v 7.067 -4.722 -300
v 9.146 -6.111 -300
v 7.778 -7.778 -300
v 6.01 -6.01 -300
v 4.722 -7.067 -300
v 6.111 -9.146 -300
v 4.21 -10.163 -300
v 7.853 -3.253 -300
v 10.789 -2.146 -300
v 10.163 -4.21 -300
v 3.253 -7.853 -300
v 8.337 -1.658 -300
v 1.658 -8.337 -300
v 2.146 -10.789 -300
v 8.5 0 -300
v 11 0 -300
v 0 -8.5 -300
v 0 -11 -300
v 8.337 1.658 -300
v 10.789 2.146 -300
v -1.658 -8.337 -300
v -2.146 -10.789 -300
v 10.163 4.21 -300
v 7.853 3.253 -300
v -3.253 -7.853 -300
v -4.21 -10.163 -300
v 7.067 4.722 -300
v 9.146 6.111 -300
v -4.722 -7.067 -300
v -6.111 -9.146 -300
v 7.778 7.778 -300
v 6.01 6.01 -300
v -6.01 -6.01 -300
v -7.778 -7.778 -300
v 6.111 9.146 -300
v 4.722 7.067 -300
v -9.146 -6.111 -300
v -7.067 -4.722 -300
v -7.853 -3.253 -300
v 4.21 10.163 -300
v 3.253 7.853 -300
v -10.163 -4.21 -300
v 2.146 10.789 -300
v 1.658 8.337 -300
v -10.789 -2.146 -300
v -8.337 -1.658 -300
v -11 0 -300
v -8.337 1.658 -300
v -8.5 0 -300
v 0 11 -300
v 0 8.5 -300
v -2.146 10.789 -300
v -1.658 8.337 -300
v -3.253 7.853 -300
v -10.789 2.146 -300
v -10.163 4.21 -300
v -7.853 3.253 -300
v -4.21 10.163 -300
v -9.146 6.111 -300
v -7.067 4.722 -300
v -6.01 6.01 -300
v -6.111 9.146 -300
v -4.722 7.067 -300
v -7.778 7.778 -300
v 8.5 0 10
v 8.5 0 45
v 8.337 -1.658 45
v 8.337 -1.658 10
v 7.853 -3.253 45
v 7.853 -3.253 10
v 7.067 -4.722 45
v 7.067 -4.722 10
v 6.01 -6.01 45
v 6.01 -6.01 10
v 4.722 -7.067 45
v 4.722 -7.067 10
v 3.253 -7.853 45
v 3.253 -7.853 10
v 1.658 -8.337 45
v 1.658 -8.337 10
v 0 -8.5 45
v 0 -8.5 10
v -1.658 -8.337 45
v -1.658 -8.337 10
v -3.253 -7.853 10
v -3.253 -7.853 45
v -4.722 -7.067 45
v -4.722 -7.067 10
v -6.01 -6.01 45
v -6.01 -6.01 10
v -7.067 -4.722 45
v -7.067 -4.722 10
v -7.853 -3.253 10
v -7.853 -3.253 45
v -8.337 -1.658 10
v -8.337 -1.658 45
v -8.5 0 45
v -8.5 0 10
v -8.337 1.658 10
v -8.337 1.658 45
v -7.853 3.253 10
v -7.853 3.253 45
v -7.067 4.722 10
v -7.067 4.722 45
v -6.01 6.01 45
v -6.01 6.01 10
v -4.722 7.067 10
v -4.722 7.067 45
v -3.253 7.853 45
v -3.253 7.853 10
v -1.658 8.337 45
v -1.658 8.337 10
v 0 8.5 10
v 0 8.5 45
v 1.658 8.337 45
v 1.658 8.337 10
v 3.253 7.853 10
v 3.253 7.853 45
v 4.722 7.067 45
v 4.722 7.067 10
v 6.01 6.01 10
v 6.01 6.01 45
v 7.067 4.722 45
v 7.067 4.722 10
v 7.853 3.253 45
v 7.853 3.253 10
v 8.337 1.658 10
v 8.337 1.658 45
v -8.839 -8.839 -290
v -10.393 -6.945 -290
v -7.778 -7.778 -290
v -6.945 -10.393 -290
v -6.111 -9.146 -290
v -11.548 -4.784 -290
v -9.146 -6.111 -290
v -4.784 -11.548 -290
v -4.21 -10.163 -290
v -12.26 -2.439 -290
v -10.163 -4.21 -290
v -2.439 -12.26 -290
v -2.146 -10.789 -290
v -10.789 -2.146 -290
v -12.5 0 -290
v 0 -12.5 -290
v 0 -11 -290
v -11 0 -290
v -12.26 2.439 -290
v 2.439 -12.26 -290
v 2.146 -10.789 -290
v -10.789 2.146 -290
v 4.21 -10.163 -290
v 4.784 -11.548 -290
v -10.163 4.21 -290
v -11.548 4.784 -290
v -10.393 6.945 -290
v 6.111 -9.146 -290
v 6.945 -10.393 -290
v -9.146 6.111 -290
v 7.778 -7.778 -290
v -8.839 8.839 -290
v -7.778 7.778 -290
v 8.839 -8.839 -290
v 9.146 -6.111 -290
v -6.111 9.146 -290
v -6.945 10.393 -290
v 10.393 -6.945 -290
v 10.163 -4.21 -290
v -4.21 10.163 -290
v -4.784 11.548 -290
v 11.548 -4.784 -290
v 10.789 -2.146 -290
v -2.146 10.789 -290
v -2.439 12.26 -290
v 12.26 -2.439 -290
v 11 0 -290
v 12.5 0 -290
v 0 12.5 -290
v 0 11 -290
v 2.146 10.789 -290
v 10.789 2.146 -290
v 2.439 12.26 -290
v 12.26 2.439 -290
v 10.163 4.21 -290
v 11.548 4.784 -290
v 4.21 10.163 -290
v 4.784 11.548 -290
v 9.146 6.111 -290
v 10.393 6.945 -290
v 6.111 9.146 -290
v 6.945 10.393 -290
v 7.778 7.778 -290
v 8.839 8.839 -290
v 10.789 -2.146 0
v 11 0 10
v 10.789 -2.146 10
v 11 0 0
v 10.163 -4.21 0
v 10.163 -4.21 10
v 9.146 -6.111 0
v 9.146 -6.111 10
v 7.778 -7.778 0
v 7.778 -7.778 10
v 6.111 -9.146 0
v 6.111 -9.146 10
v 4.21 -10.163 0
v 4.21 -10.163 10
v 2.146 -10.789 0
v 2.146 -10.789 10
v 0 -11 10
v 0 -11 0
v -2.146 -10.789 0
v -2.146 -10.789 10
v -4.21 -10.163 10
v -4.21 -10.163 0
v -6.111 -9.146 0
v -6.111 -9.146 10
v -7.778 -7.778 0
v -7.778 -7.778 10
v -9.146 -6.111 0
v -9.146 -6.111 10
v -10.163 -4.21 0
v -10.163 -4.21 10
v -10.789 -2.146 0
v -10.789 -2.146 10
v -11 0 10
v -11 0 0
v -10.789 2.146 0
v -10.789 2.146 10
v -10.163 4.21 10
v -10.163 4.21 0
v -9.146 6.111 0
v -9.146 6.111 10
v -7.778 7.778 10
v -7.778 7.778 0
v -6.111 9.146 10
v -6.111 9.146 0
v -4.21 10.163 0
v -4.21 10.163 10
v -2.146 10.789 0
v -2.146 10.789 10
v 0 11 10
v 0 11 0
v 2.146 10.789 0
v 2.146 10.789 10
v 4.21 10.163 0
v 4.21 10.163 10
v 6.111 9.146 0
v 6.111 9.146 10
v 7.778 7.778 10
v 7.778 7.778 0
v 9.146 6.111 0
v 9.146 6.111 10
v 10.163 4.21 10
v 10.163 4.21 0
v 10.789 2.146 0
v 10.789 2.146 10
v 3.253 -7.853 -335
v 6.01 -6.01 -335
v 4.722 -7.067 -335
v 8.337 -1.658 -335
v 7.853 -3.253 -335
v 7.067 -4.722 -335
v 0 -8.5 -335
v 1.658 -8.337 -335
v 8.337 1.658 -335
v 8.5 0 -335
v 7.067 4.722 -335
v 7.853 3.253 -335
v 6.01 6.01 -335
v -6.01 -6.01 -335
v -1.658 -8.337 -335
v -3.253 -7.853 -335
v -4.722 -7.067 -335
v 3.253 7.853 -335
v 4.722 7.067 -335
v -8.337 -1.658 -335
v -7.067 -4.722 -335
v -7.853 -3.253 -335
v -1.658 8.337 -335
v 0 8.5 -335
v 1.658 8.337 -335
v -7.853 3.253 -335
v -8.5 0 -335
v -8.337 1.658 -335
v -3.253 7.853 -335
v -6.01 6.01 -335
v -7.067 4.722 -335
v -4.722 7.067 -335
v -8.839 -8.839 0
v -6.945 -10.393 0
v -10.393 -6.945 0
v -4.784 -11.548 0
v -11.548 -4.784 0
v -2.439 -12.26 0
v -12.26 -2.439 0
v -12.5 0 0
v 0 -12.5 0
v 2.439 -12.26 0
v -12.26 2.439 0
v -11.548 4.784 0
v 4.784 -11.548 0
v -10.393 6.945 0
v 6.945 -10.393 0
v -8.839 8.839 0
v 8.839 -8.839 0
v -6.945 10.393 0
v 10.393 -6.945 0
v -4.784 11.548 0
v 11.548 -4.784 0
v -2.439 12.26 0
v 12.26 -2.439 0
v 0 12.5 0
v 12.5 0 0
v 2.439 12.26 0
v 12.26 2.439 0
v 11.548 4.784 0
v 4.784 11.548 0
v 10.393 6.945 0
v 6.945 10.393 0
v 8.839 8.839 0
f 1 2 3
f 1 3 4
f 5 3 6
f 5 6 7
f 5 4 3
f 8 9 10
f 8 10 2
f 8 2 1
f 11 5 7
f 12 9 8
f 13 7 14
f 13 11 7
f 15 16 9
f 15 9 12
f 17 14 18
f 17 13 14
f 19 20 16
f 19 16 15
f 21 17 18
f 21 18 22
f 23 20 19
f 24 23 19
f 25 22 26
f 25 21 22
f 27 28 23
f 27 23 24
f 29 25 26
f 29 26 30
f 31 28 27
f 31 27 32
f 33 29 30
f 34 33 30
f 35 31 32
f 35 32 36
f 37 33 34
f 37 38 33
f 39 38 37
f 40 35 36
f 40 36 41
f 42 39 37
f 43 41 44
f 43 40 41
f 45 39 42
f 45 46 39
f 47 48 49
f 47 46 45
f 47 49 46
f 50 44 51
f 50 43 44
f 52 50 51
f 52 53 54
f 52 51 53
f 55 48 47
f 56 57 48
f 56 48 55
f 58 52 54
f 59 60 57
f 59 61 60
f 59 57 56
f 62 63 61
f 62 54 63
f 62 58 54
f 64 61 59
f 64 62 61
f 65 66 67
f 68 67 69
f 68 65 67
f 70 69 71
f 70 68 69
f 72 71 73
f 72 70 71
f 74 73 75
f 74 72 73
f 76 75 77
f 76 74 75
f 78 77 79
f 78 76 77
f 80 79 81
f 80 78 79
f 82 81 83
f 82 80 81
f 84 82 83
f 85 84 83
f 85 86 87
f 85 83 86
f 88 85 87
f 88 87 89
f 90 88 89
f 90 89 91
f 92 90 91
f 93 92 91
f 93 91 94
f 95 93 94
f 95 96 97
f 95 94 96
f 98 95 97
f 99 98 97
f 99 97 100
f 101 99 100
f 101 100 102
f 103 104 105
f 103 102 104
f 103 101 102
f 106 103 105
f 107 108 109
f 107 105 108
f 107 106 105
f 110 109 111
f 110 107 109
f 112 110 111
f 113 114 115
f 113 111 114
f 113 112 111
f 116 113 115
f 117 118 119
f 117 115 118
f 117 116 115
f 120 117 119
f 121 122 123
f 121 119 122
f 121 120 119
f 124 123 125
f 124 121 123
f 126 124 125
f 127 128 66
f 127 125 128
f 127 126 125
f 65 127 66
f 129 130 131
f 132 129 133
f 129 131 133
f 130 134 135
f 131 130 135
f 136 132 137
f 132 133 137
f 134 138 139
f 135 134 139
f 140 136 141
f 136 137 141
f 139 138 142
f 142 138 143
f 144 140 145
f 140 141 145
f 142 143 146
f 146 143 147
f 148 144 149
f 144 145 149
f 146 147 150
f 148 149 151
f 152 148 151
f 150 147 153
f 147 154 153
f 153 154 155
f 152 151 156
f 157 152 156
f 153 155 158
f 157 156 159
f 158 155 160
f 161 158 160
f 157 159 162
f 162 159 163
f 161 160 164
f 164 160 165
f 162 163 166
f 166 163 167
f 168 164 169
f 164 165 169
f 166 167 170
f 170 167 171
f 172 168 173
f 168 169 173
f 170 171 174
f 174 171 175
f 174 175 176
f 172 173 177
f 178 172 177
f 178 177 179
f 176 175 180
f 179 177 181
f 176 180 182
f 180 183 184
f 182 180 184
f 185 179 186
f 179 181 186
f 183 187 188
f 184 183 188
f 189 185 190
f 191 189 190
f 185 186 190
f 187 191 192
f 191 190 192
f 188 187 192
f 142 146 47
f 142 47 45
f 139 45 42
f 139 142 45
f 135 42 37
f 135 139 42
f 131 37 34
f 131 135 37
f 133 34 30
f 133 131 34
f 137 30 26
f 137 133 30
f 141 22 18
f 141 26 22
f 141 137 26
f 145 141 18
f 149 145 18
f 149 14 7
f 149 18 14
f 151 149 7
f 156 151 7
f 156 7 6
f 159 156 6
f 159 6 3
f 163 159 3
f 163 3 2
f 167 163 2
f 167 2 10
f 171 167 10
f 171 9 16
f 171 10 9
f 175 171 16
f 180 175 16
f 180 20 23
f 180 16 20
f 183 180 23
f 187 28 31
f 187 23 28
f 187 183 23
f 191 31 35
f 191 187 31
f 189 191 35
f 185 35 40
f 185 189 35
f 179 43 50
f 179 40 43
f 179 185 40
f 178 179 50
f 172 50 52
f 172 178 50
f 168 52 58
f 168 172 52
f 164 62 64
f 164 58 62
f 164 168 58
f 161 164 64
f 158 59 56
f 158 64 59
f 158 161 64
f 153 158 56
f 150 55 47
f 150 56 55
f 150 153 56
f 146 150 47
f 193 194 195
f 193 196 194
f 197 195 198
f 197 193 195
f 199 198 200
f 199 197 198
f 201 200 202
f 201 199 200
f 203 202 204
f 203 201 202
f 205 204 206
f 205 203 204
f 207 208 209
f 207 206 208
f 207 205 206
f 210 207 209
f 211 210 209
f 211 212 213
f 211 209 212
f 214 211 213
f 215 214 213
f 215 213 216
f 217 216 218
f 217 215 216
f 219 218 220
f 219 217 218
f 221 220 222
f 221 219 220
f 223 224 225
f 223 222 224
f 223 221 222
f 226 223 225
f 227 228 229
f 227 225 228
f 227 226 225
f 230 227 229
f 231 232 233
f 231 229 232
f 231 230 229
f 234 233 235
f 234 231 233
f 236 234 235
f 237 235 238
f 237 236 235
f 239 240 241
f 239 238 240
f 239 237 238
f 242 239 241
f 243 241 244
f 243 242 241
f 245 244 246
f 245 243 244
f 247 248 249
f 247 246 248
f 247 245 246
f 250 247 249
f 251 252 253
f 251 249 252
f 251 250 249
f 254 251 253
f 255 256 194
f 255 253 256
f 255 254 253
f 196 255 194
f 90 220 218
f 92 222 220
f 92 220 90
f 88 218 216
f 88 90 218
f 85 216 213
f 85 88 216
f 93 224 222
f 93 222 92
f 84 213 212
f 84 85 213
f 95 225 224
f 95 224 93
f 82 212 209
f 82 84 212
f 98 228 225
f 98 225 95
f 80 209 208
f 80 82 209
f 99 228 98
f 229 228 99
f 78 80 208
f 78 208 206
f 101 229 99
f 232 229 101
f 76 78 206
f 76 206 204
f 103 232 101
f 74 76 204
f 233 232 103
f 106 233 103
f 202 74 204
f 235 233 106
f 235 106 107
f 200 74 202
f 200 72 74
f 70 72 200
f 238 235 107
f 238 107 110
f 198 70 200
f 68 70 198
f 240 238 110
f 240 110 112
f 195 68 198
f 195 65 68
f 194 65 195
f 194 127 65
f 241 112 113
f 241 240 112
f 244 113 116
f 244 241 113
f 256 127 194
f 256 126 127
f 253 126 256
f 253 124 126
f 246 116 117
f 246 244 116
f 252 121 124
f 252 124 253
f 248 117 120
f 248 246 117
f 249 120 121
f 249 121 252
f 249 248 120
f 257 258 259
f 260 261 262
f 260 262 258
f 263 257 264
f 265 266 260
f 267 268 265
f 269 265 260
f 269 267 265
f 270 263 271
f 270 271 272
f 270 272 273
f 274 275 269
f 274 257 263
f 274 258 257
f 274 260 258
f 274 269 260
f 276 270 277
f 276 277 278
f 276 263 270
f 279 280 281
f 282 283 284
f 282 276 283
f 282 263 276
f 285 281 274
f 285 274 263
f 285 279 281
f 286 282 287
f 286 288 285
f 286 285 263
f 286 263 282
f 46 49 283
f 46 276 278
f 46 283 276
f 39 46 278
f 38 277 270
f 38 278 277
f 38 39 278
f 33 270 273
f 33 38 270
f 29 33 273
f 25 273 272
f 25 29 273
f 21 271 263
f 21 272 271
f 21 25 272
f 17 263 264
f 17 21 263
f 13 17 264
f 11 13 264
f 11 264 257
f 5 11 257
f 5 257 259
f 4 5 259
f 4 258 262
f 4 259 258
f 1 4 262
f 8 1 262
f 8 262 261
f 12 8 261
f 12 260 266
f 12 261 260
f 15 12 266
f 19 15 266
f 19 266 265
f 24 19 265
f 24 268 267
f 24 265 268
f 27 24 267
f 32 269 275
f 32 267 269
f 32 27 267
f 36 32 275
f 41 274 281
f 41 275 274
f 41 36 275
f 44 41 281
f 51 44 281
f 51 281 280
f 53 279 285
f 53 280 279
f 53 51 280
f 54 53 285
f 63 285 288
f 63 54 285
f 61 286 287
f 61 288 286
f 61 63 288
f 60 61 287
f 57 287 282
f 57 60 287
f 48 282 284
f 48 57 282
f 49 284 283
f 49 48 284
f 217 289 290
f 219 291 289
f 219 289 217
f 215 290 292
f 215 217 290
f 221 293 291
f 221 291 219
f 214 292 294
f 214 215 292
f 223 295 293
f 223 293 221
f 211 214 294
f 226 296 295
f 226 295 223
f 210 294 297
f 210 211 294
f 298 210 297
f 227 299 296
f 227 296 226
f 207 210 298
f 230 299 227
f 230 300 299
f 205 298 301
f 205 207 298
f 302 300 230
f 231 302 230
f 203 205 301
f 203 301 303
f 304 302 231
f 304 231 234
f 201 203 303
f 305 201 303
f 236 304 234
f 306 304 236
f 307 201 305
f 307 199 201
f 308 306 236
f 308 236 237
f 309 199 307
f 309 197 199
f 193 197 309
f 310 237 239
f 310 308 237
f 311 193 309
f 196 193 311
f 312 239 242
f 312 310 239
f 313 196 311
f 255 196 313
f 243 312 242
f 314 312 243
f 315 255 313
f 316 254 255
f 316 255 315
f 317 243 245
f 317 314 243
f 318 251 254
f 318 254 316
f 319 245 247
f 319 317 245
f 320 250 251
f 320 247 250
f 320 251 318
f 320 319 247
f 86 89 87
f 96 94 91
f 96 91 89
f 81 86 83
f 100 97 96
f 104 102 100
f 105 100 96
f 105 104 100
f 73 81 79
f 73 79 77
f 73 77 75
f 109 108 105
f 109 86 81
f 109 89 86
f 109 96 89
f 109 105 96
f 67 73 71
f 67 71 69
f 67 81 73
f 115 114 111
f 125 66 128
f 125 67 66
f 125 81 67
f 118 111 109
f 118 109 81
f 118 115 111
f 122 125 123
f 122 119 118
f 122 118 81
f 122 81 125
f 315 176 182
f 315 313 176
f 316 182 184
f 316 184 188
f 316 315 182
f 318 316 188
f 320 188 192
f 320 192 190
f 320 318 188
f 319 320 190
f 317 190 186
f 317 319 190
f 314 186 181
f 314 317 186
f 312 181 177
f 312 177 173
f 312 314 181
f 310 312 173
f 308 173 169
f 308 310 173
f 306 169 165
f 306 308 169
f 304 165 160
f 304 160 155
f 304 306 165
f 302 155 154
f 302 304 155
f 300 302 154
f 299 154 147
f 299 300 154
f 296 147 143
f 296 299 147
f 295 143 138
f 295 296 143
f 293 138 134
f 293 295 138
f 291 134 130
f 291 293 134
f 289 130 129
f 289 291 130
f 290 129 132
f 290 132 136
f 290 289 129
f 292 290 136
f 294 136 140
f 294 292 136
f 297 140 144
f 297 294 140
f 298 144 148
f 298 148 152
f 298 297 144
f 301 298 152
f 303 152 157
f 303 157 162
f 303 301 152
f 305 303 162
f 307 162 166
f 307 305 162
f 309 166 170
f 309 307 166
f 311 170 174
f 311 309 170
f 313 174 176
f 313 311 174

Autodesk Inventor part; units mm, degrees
ref_plane "YZ Plane" through (0, 0, 0) normal (1, 0, 0) x (0, 1, 0)
ref_plane "XZ Plane" through (0, 0, 0) normal (0, 1, 0) x (-1, 0, 0)
ref_plane "XY Plane" through (0, 0, 0) normal (0, 0, 1) x (1, 0, 0)
sketch "Sketch1" plane through (0, 0, 0) normal (0, 0, 1) x (1, 0, 0)
  circle A0 centre (0, 0) radius 12.5
  dimension "d0" = 25
extrude "Extrusion1" add sketch "Sketch1" against normal blind 290
sketch "Sketch2" plane through (0, 0, 0) normal (0, 0, 1) x (1, 0, 0)
  circle A0 centre (0, 0) radius 11
  dimension "d3" = 22
extrude "Extrusion2" add sketch "Sketch2" along normal blind 10
sketch "Sketch3" plane through (0, 0, 0) normal (0, 0, 1) x (1, 0, 0)
  circle A0 centre (0, 0) radius 8.5
  dimension "d6" = 17
extrude "Extrusion3" add sketch "Sketch3" along normal blind 45
sketch "Sketch4" plane through (0, 0, -290) normal (0, 0, -1) x (-1, 0, 0)
  circle A0 centre (0, 0) radius 11
  dimension "d9" = 22
extrude "Extrusion4" add sketch "Sketch4" along normal blind 10
sketch "Sketch5" plane through (0, 0, -300) normal (0, 0, -1) x (-1, 0, 0)
  circle A0 centre (0, 0) radius 8.5
  dimension "d12" = 17
extrude "Extrusion5" add sketch "Sketch5" along normal blind 35
